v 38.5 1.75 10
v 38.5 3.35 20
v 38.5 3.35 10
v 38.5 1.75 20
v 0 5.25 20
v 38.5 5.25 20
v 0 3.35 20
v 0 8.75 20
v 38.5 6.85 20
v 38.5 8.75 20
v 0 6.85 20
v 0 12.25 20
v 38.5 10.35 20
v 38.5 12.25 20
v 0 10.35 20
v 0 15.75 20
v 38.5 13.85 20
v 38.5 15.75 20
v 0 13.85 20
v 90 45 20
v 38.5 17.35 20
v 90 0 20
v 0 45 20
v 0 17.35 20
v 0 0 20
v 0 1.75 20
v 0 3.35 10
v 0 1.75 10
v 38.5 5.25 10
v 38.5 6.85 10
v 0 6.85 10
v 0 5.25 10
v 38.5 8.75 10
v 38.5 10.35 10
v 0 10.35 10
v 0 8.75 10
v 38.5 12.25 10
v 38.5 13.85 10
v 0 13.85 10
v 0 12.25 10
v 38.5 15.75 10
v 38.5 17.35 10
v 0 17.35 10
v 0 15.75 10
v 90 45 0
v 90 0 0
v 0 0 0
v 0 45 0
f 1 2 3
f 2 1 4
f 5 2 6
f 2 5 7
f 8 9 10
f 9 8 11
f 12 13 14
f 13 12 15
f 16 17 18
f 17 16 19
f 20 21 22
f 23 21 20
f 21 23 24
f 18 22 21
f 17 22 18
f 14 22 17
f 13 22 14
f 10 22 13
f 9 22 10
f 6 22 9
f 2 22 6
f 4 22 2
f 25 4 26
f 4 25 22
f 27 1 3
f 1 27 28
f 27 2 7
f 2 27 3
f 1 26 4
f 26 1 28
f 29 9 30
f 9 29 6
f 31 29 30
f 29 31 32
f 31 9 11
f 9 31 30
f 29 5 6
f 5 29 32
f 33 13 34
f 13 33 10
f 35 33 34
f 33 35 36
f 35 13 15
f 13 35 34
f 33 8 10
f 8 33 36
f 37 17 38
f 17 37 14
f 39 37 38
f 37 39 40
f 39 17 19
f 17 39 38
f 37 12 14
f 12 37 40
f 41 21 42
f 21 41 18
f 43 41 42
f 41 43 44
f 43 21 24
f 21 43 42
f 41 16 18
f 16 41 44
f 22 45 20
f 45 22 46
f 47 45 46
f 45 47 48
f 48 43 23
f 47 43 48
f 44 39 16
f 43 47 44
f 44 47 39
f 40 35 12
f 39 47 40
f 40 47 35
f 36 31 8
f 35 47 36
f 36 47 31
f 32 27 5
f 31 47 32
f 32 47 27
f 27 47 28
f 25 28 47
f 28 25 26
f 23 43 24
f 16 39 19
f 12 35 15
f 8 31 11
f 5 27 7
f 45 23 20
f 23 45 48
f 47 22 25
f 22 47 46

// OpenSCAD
// Drying Rack for 10 Microscope Slides
// Base: 90 x 45 x 20 mm
// Slots: 10 parallel slots, 77mm long, 1.6mm wide, 10mm deep
// Spacing: 3.5mm centre-to-centre (Y)

$fn = 128; // High resolution for smooth slot edges

// Base Dimensions
base_length = 90;  // X
base_width = 45;   // Y
base_height = 20;  // Z

// Slot Dimensions
slot_length = 77;  // X
slot_width = 1.6;  // Y
slot_depth = 10;   // Z (cut depth)

// Layout
num_slots = 10;
slot_spacing = 3.5; // Centre-to-centre in Y

// Calculate Y position of the first slot centre
// The group of centres is symmetric around 0.
// First slot centre = - ( (num_slots - 1) * slot_spacing ) / 2
first_slot_y = -((num_slots - 1) * slot_spacing) / 2;

// Generate the main block
difference() {
    // 1. Create the solid base block
    translate([0, 0, 0])
    cube([base_length, base_width, base_height]);

    // 2. Cut the 10 slots
    // Slots run along X, so we cut a long rectangular prism from the top face downwards
    for (i = [0 : num_slots - 1]) {
        // Calculate Y position for this specific slot
        current_y = first_slot_y + (i * slot_spacing);
        
        // Define the cutting volume
        // The slot is open at the top (Z=base_height) and goes down to Z = base_height - slot_depth
        // It runs the full length of the slot (slot_length) centered in X
        // It has width slot_width centered in Y
        
        translate([
            -slot_length / 2, 
            current_y, 
            base_height - slot_depth
        ])
        cube([
            slot_length, 
            slot_width, 
            slot_depth
        ]);
    }
}
